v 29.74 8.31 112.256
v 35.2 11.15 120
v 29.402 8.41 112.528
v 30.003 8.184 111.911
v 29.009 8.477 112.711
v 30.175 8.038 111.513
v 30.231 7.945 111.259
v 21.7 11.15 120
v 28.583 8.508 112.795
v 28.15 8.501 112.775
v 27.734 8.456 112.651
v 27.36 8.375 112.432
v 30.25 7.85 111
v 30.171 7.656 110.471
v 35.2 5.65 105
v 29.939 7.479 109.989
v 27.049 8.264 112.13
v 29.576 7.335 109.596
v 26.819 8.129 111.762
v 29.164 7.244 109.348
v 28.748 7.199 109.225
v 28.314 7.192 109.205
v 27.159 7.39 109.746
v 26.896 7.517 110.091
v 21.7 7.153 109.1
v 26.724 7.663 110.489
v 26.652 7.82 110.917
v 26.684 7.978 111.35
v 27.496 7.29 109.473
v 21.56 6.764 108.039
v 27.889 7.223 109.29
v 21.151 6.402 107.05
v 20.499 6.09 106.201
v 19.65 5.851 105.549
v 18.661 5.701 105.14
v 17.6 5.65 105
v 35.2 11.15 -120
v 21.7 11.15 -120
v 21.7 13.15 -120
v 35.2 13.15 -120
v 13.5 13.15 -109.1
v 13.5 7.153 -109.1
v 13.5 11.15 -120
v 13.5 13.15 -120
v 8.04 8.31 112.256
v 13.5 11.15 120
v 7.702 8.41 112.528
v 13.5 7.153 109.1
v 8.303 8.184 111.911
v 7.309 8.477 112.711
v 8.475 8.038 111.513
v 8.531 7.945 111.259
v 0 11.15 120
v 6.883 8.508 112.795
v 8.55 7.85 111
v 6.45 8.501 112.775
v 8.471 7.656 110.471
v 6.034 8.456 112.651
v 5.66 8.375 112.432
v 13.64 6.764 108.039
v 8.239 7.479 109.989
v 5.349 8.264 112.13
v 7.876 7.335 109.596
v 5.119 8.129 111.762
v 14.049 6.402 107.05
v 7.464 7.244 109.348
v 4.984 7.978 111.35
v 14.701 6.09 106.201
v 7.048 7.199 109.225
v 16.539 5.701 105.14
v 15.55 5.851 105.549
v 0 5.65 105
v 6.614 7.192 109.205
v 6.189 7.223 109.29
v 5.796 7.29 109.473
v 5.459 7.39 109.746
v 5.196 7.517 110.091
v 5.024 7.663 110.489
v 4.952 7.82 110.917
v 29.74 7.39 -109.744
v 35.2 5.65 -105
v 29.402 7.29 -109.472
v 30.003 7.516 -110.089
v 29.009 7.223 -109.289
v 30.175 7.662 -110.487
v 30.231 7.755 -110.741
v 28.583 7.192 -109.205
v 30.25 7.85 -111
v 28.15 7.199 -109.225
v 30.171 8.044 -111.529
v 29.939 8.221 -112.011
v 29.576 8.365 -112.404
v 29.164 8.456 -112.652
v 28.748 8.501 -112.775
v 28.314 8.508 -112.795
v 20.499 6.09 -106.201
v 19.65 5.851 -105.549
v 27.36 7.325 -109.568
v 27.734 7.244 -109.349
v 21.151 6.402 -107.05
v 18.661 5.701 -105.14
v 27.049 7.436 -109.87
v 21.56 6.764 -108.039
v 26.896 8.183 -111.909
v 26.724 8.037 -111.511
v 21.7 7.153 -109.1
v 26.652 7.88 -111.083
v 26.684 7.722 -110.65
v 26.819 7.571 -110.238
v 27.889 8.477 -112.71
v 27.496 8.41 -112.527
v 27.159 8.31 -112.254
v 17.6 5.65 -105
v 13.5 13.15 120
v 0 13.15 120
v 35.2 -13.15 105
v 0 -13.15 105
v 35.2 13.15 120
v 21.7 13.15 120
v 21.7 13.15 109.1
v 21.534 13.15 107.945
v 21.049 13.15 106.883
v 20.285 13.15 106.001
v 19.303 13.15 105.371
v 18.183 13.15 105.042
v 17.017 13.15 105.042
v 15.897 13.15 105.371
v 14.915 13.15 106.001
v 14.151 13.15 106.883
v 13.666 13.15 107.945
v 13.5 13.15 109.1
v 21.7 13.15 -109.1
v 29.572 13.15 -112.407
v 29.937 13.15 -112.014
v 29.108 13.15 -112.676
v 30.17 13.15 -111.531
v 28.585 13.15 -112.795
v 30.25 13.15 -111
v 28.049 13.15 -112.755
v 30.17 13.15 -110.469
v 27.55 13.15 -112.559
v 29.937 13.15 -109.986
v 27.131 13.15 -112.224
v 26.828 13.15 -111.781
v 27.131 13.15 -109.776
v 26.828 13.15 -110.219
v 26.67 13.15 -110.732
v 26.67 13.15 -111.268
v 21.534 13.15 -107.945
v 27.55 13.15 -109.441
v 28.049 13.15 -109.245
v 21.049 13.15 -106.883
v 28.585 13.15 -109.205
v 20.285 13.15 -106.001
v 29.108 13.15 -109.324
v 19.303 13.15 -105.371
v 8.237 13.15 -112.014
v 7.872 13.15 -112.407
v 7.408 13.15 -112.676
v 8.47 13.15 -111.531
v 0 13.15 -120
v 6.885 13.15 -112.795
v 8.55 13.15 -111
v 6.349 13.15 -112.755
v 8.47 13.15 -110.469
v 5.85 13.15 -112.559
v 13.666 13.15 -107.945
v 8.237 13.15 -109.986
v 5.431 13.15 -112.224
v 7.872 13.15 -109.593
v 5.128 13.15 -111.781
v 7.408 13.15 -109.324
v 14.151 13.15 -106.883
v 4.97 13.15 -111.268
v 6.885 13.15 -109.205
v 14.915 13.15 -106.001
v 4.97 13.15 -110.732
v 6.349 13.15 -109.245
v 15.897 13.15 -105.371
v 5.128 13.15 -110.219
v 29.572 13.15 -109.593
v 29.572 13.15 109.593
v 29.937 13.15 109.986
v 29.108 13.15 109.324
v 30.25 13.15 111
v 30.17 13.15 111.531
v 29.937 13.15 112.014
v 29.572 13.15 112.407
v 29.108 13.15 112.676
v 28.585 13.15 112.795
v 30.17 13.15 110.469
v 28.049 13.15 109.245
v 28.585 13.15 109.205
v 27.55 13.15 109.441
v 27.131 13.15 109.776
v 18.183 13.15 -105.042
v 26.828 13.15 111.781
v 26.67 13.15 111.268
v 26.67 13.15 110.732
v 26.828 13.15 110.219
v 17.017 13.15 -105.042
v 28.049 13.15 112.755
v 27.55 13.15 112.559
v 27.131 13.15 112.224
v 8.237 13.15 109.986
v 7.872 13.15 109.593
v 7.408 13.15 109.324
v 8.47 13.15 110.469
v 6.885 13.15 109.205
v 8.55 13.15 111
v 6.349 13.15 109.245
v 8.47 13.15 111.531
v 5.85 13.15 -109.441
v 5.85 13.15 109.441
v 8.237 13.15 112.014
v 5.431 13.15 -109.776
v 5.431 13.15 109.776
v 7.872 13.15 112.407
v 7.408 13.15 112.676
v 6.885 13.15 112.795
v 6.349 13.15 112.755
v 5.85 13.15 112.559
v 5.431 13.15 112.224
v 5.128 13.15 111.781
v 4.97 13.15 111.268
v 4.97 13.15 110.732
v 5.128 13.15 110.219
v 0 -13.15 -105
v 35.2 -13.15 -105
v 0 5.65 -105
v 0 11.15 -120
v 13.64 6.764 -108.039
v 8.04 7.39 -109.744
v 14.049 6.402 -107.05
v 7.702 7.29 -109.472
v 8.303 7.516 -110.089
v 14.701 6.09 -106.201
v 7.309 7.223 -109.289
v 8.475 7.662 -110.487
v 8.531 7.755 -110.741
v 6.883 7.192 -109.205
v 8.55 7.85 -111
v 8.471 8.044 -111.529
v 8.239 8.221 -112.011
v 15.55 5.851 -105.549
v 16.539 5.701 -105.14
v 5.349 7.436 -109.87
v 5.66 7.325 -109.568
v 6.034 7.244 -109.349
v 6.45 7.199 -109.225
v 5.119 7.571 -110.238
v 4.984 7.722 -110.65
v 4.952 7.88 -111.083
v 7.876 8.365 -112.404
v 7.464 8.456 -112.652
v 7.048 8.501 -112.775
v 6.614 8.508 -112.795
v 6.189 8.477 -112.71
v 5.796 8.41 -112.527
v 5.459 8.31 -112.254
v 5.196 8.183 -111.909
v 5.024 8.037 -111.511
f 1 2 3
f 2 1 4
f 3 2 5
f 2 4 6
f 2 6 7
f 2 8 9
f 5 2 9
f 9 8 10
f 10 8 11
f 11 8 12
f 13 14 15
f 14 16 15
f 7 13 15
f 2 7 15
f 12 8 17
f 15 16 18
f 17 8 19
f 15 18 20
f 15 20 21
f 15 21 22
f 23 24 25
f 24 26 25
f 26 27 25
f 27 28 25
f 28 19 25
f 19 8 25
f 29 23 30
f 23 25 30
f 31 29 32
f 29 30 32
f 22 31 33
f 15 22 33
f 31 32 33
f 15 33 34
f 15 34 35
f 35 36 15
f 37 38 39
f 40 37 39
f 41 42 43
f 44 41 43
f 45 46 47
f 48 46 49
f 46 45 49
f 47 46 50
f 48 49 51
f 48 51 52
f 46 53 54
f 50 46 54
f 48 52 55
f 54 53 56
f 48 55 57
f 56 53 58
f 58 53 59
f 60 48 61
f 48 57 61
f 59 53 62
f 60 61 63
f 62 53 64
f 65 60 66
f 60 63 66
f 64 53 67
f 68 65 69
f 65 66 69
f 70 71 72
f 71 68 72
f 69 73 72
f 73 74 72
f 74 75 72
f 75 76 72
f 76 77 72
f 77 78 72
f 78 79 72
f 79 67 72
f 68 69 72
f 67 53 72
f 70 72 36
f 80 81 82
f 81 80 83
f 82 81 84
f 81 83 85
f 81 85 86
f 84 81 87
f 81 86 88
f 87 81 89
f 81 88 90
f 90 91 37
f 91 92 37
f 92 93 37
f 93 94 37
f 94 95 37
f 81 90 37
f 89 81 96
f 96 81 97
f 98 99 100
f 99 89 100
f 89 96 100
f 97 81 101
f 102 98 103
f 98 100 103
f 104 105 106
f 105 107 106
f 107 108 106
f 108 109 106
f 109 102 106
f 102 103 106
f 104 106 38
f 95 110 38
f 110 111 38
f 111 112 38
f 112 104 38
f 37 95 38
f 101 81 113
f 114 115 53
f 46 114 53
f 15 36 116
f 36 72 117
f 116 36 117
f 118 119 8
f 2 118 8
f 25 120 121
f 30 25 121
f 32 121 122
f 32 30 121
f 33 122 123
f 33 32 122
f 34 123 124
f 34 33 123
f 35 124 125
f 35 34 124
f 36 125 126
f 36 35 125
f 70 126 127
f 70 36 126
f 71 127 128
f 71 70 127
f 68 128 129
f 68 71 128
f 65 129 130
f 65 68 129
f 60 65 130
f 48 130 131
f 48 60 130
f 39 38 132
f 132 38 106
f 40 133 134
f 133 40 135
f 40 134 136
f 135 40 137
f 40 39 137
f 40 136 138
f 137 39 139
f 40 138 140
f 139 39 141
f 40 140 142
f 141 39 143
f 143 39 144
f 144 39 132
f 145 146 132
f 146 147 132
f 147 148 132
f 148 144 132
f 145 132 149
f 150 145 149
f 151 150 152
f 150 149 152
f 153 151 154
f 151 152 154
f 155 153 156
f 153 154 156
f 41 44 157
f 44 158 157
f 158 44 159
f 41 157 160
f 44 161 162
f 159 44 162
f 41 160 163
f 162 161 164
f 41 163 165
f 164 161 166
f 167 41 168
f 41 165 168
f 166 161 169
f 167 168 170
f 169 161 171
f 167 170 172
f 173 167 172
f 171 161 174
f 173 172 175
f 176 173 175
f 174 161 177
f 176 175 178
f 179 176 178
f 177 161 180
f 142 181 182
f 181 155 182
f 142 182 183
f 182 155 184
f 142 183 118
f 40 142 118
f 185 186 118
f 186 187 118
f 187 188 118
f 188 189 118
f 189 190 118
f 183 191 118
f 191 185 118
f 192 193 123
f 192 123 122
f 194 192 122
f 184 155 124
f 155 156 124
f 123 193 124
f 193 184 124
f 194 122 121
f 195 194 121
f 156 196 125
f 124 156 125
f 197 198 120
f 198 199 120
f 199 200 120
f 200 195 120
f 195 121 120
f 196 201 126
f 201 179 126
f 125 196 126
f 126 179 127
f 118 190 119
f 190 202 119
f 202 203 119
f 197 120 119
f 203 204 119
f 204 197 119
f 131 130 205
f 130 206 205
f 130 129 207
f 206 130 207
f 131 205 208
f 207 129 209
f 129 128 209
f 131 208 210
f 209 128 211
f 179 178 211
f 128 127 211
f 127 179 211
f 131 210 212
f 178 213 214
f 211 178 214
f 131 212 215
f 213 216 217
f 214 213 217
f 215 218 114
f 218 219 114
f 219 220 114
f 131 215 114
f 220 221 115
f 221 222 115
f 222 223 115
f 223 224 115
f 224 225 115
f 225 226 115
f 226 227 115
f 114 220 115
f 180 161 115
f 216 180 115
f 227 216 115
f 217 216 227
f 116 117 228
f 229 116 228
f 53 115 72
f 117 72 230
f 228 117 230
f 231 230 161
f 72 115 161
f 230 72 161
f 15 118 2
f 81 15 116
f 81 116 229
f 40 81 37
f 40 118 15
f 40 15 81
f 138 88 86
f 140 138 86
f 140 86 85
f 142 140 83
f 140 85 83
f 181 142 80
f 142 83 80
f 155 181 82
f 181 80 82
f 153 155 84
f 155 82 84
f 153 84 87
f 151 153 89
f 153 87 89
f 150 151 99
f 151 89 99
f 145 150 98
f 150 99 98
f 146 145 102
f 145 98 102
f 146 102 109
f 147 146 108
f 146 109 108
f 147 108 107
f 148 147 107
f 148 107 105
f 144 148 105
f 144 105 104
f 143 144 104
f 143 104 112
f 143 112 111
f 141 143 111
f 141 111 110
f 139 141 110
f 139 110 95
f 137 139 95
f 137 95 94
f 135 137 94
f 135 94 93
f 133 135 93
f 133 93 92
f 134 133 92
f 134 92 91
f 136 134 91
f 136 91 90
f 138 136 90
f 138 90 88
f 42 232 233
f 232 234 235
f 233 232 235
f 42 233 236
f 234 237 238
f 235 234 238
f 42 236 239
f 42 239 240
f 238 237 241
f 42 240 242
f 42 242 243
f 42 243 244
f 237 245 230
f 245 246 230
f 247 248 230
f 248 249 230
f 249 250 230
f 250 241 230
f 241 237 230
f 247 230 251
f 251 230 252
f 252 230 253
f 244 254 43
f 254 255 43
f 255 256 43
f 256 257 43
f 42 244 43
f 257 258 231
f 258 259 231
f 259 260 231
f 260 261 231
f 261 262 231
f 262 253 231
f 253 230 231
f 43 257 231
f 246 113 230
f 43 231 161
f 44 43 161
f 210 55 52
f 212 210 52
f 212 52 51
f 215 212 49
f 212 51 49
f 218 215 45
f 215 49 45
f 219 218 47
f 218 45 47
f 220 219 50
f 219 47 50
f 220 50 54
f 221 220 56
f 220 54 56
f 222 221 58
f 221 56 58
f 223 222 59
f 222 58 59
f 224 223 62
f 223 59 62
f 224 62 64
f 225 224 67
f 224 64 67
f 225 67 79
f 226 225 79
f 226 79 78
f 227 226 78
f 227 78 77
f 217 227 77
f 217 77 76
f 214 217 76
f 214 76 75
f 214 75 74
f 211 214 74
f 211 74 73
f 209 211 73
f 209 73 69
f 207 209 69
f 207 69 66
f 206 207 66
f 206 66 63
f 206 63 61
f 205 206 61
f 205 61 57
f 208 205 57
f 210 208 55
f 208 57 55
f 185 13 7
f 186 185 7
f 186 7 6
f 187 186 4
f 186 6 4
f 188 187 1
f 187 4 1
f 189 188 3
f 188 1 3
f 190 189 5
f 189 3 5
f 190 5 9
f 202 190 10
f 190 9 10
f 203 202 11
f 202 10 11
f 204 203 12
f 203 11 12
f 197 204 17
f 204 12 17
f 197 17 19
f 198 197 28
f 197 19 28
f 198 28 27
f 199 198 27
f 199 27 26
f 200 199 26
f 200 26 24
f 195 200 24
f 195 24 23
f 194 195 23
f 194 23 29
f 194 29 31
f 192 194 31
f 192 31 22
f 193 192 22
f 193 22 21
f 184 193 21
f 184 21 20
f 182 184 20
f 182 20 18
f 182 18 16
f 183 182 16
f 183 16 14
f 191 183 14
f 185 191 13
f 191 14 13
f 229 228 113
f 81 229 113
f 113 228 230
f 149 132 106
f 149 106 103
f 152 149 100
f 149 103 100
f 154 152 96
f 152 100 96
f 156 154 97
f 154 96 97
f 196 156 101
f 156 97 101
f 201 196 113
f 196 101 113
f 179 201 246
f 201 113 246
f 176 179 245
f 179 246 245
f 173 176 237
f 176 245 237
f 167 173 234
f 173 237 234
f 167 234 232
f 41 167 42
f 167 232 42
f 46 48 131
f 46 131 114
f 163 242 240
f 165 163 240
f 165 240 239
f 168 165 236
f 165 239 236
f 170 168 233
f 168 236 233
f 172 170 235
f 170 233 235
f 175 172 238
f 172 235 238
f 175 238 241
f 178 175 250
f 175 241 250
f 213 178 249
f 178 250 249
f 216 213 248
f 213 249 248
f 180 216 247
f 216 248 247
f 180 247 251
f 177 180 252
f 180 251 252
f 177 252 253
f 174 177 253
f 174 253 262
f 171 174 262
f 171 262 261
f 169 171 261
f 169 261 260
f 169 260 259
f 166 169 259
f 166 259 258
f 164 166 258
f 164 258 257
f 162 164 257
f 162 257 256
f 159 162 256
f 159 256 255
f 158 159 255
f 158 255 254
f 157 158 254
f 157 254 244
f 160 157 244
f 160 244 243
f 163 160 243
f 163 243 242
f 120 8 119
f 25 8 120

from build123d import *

# Parameters (mm, degrees)
RESSALTO_EXTRUS_O1_DEPTH = 35.2
ESBO_O2_R                = 1.8
CORTE_EXTRUS_O1_DEPTH    = 35.2


with BuildPart() as part:
    # Esboço1 → Ressalto-extrusão1 (new body)
    with BuildSketch(Plane(origin=(0, 0, 0), x_dir=(0, 0, -1), z_dir=(1, 0, 0))):
        Polygon((-105, 13.15), (-120, 13.15), (-120, 11.15), (-105, 5.65), (-105, -13.15), (105, -13.15), (105, 5.65), (120, 11.15), (120, 13.15), (105, 13.15), align=None)
    extrude(amount=RESSALTO_EXTRUS_O1_DEPTH)

    # Esboço2 → Corte-extrusão1 (cut)
    with BuildSketch(Plane.XZ.offset(13.15)):
        with Locations((6.75, 111)):
            Circle(ESBO_O2_R)
        with Locations((28.45, 111)):
            Circle(ESBO_O2_R)
        with Locations((28.45, -111)):
            Circle(ESBO_O2_R)
        with Locations((6.75, -111)):
            Circle(ESBO_O2_R)
        with BuildLine():
            Line((13.5, 109.1), (13.5, 120))
            Line((13.5, 120), (21.7, 120))
            Line((21.7, 120), (21.7, 109.1))
            ThreePointArc((21.7, 109.1), (17.6, 105), (13.5, 109.1))
        make_face()
        with BuildLine():
            Line((13.5, -120), (21.7, -120))
            Line((21.7, -120), (21.7, -109.1))
            ThreePointArc((21.7, -109.1), (17.6, -105), (13.5, -109.1))
            Line((13.5, -109.1), (13.5, -120))
        make_face()
    extrude(amount=-CORTE_EXTRUS_O1_DEPTH, mode=Mode.SUBTRACT)


solid = part.part
